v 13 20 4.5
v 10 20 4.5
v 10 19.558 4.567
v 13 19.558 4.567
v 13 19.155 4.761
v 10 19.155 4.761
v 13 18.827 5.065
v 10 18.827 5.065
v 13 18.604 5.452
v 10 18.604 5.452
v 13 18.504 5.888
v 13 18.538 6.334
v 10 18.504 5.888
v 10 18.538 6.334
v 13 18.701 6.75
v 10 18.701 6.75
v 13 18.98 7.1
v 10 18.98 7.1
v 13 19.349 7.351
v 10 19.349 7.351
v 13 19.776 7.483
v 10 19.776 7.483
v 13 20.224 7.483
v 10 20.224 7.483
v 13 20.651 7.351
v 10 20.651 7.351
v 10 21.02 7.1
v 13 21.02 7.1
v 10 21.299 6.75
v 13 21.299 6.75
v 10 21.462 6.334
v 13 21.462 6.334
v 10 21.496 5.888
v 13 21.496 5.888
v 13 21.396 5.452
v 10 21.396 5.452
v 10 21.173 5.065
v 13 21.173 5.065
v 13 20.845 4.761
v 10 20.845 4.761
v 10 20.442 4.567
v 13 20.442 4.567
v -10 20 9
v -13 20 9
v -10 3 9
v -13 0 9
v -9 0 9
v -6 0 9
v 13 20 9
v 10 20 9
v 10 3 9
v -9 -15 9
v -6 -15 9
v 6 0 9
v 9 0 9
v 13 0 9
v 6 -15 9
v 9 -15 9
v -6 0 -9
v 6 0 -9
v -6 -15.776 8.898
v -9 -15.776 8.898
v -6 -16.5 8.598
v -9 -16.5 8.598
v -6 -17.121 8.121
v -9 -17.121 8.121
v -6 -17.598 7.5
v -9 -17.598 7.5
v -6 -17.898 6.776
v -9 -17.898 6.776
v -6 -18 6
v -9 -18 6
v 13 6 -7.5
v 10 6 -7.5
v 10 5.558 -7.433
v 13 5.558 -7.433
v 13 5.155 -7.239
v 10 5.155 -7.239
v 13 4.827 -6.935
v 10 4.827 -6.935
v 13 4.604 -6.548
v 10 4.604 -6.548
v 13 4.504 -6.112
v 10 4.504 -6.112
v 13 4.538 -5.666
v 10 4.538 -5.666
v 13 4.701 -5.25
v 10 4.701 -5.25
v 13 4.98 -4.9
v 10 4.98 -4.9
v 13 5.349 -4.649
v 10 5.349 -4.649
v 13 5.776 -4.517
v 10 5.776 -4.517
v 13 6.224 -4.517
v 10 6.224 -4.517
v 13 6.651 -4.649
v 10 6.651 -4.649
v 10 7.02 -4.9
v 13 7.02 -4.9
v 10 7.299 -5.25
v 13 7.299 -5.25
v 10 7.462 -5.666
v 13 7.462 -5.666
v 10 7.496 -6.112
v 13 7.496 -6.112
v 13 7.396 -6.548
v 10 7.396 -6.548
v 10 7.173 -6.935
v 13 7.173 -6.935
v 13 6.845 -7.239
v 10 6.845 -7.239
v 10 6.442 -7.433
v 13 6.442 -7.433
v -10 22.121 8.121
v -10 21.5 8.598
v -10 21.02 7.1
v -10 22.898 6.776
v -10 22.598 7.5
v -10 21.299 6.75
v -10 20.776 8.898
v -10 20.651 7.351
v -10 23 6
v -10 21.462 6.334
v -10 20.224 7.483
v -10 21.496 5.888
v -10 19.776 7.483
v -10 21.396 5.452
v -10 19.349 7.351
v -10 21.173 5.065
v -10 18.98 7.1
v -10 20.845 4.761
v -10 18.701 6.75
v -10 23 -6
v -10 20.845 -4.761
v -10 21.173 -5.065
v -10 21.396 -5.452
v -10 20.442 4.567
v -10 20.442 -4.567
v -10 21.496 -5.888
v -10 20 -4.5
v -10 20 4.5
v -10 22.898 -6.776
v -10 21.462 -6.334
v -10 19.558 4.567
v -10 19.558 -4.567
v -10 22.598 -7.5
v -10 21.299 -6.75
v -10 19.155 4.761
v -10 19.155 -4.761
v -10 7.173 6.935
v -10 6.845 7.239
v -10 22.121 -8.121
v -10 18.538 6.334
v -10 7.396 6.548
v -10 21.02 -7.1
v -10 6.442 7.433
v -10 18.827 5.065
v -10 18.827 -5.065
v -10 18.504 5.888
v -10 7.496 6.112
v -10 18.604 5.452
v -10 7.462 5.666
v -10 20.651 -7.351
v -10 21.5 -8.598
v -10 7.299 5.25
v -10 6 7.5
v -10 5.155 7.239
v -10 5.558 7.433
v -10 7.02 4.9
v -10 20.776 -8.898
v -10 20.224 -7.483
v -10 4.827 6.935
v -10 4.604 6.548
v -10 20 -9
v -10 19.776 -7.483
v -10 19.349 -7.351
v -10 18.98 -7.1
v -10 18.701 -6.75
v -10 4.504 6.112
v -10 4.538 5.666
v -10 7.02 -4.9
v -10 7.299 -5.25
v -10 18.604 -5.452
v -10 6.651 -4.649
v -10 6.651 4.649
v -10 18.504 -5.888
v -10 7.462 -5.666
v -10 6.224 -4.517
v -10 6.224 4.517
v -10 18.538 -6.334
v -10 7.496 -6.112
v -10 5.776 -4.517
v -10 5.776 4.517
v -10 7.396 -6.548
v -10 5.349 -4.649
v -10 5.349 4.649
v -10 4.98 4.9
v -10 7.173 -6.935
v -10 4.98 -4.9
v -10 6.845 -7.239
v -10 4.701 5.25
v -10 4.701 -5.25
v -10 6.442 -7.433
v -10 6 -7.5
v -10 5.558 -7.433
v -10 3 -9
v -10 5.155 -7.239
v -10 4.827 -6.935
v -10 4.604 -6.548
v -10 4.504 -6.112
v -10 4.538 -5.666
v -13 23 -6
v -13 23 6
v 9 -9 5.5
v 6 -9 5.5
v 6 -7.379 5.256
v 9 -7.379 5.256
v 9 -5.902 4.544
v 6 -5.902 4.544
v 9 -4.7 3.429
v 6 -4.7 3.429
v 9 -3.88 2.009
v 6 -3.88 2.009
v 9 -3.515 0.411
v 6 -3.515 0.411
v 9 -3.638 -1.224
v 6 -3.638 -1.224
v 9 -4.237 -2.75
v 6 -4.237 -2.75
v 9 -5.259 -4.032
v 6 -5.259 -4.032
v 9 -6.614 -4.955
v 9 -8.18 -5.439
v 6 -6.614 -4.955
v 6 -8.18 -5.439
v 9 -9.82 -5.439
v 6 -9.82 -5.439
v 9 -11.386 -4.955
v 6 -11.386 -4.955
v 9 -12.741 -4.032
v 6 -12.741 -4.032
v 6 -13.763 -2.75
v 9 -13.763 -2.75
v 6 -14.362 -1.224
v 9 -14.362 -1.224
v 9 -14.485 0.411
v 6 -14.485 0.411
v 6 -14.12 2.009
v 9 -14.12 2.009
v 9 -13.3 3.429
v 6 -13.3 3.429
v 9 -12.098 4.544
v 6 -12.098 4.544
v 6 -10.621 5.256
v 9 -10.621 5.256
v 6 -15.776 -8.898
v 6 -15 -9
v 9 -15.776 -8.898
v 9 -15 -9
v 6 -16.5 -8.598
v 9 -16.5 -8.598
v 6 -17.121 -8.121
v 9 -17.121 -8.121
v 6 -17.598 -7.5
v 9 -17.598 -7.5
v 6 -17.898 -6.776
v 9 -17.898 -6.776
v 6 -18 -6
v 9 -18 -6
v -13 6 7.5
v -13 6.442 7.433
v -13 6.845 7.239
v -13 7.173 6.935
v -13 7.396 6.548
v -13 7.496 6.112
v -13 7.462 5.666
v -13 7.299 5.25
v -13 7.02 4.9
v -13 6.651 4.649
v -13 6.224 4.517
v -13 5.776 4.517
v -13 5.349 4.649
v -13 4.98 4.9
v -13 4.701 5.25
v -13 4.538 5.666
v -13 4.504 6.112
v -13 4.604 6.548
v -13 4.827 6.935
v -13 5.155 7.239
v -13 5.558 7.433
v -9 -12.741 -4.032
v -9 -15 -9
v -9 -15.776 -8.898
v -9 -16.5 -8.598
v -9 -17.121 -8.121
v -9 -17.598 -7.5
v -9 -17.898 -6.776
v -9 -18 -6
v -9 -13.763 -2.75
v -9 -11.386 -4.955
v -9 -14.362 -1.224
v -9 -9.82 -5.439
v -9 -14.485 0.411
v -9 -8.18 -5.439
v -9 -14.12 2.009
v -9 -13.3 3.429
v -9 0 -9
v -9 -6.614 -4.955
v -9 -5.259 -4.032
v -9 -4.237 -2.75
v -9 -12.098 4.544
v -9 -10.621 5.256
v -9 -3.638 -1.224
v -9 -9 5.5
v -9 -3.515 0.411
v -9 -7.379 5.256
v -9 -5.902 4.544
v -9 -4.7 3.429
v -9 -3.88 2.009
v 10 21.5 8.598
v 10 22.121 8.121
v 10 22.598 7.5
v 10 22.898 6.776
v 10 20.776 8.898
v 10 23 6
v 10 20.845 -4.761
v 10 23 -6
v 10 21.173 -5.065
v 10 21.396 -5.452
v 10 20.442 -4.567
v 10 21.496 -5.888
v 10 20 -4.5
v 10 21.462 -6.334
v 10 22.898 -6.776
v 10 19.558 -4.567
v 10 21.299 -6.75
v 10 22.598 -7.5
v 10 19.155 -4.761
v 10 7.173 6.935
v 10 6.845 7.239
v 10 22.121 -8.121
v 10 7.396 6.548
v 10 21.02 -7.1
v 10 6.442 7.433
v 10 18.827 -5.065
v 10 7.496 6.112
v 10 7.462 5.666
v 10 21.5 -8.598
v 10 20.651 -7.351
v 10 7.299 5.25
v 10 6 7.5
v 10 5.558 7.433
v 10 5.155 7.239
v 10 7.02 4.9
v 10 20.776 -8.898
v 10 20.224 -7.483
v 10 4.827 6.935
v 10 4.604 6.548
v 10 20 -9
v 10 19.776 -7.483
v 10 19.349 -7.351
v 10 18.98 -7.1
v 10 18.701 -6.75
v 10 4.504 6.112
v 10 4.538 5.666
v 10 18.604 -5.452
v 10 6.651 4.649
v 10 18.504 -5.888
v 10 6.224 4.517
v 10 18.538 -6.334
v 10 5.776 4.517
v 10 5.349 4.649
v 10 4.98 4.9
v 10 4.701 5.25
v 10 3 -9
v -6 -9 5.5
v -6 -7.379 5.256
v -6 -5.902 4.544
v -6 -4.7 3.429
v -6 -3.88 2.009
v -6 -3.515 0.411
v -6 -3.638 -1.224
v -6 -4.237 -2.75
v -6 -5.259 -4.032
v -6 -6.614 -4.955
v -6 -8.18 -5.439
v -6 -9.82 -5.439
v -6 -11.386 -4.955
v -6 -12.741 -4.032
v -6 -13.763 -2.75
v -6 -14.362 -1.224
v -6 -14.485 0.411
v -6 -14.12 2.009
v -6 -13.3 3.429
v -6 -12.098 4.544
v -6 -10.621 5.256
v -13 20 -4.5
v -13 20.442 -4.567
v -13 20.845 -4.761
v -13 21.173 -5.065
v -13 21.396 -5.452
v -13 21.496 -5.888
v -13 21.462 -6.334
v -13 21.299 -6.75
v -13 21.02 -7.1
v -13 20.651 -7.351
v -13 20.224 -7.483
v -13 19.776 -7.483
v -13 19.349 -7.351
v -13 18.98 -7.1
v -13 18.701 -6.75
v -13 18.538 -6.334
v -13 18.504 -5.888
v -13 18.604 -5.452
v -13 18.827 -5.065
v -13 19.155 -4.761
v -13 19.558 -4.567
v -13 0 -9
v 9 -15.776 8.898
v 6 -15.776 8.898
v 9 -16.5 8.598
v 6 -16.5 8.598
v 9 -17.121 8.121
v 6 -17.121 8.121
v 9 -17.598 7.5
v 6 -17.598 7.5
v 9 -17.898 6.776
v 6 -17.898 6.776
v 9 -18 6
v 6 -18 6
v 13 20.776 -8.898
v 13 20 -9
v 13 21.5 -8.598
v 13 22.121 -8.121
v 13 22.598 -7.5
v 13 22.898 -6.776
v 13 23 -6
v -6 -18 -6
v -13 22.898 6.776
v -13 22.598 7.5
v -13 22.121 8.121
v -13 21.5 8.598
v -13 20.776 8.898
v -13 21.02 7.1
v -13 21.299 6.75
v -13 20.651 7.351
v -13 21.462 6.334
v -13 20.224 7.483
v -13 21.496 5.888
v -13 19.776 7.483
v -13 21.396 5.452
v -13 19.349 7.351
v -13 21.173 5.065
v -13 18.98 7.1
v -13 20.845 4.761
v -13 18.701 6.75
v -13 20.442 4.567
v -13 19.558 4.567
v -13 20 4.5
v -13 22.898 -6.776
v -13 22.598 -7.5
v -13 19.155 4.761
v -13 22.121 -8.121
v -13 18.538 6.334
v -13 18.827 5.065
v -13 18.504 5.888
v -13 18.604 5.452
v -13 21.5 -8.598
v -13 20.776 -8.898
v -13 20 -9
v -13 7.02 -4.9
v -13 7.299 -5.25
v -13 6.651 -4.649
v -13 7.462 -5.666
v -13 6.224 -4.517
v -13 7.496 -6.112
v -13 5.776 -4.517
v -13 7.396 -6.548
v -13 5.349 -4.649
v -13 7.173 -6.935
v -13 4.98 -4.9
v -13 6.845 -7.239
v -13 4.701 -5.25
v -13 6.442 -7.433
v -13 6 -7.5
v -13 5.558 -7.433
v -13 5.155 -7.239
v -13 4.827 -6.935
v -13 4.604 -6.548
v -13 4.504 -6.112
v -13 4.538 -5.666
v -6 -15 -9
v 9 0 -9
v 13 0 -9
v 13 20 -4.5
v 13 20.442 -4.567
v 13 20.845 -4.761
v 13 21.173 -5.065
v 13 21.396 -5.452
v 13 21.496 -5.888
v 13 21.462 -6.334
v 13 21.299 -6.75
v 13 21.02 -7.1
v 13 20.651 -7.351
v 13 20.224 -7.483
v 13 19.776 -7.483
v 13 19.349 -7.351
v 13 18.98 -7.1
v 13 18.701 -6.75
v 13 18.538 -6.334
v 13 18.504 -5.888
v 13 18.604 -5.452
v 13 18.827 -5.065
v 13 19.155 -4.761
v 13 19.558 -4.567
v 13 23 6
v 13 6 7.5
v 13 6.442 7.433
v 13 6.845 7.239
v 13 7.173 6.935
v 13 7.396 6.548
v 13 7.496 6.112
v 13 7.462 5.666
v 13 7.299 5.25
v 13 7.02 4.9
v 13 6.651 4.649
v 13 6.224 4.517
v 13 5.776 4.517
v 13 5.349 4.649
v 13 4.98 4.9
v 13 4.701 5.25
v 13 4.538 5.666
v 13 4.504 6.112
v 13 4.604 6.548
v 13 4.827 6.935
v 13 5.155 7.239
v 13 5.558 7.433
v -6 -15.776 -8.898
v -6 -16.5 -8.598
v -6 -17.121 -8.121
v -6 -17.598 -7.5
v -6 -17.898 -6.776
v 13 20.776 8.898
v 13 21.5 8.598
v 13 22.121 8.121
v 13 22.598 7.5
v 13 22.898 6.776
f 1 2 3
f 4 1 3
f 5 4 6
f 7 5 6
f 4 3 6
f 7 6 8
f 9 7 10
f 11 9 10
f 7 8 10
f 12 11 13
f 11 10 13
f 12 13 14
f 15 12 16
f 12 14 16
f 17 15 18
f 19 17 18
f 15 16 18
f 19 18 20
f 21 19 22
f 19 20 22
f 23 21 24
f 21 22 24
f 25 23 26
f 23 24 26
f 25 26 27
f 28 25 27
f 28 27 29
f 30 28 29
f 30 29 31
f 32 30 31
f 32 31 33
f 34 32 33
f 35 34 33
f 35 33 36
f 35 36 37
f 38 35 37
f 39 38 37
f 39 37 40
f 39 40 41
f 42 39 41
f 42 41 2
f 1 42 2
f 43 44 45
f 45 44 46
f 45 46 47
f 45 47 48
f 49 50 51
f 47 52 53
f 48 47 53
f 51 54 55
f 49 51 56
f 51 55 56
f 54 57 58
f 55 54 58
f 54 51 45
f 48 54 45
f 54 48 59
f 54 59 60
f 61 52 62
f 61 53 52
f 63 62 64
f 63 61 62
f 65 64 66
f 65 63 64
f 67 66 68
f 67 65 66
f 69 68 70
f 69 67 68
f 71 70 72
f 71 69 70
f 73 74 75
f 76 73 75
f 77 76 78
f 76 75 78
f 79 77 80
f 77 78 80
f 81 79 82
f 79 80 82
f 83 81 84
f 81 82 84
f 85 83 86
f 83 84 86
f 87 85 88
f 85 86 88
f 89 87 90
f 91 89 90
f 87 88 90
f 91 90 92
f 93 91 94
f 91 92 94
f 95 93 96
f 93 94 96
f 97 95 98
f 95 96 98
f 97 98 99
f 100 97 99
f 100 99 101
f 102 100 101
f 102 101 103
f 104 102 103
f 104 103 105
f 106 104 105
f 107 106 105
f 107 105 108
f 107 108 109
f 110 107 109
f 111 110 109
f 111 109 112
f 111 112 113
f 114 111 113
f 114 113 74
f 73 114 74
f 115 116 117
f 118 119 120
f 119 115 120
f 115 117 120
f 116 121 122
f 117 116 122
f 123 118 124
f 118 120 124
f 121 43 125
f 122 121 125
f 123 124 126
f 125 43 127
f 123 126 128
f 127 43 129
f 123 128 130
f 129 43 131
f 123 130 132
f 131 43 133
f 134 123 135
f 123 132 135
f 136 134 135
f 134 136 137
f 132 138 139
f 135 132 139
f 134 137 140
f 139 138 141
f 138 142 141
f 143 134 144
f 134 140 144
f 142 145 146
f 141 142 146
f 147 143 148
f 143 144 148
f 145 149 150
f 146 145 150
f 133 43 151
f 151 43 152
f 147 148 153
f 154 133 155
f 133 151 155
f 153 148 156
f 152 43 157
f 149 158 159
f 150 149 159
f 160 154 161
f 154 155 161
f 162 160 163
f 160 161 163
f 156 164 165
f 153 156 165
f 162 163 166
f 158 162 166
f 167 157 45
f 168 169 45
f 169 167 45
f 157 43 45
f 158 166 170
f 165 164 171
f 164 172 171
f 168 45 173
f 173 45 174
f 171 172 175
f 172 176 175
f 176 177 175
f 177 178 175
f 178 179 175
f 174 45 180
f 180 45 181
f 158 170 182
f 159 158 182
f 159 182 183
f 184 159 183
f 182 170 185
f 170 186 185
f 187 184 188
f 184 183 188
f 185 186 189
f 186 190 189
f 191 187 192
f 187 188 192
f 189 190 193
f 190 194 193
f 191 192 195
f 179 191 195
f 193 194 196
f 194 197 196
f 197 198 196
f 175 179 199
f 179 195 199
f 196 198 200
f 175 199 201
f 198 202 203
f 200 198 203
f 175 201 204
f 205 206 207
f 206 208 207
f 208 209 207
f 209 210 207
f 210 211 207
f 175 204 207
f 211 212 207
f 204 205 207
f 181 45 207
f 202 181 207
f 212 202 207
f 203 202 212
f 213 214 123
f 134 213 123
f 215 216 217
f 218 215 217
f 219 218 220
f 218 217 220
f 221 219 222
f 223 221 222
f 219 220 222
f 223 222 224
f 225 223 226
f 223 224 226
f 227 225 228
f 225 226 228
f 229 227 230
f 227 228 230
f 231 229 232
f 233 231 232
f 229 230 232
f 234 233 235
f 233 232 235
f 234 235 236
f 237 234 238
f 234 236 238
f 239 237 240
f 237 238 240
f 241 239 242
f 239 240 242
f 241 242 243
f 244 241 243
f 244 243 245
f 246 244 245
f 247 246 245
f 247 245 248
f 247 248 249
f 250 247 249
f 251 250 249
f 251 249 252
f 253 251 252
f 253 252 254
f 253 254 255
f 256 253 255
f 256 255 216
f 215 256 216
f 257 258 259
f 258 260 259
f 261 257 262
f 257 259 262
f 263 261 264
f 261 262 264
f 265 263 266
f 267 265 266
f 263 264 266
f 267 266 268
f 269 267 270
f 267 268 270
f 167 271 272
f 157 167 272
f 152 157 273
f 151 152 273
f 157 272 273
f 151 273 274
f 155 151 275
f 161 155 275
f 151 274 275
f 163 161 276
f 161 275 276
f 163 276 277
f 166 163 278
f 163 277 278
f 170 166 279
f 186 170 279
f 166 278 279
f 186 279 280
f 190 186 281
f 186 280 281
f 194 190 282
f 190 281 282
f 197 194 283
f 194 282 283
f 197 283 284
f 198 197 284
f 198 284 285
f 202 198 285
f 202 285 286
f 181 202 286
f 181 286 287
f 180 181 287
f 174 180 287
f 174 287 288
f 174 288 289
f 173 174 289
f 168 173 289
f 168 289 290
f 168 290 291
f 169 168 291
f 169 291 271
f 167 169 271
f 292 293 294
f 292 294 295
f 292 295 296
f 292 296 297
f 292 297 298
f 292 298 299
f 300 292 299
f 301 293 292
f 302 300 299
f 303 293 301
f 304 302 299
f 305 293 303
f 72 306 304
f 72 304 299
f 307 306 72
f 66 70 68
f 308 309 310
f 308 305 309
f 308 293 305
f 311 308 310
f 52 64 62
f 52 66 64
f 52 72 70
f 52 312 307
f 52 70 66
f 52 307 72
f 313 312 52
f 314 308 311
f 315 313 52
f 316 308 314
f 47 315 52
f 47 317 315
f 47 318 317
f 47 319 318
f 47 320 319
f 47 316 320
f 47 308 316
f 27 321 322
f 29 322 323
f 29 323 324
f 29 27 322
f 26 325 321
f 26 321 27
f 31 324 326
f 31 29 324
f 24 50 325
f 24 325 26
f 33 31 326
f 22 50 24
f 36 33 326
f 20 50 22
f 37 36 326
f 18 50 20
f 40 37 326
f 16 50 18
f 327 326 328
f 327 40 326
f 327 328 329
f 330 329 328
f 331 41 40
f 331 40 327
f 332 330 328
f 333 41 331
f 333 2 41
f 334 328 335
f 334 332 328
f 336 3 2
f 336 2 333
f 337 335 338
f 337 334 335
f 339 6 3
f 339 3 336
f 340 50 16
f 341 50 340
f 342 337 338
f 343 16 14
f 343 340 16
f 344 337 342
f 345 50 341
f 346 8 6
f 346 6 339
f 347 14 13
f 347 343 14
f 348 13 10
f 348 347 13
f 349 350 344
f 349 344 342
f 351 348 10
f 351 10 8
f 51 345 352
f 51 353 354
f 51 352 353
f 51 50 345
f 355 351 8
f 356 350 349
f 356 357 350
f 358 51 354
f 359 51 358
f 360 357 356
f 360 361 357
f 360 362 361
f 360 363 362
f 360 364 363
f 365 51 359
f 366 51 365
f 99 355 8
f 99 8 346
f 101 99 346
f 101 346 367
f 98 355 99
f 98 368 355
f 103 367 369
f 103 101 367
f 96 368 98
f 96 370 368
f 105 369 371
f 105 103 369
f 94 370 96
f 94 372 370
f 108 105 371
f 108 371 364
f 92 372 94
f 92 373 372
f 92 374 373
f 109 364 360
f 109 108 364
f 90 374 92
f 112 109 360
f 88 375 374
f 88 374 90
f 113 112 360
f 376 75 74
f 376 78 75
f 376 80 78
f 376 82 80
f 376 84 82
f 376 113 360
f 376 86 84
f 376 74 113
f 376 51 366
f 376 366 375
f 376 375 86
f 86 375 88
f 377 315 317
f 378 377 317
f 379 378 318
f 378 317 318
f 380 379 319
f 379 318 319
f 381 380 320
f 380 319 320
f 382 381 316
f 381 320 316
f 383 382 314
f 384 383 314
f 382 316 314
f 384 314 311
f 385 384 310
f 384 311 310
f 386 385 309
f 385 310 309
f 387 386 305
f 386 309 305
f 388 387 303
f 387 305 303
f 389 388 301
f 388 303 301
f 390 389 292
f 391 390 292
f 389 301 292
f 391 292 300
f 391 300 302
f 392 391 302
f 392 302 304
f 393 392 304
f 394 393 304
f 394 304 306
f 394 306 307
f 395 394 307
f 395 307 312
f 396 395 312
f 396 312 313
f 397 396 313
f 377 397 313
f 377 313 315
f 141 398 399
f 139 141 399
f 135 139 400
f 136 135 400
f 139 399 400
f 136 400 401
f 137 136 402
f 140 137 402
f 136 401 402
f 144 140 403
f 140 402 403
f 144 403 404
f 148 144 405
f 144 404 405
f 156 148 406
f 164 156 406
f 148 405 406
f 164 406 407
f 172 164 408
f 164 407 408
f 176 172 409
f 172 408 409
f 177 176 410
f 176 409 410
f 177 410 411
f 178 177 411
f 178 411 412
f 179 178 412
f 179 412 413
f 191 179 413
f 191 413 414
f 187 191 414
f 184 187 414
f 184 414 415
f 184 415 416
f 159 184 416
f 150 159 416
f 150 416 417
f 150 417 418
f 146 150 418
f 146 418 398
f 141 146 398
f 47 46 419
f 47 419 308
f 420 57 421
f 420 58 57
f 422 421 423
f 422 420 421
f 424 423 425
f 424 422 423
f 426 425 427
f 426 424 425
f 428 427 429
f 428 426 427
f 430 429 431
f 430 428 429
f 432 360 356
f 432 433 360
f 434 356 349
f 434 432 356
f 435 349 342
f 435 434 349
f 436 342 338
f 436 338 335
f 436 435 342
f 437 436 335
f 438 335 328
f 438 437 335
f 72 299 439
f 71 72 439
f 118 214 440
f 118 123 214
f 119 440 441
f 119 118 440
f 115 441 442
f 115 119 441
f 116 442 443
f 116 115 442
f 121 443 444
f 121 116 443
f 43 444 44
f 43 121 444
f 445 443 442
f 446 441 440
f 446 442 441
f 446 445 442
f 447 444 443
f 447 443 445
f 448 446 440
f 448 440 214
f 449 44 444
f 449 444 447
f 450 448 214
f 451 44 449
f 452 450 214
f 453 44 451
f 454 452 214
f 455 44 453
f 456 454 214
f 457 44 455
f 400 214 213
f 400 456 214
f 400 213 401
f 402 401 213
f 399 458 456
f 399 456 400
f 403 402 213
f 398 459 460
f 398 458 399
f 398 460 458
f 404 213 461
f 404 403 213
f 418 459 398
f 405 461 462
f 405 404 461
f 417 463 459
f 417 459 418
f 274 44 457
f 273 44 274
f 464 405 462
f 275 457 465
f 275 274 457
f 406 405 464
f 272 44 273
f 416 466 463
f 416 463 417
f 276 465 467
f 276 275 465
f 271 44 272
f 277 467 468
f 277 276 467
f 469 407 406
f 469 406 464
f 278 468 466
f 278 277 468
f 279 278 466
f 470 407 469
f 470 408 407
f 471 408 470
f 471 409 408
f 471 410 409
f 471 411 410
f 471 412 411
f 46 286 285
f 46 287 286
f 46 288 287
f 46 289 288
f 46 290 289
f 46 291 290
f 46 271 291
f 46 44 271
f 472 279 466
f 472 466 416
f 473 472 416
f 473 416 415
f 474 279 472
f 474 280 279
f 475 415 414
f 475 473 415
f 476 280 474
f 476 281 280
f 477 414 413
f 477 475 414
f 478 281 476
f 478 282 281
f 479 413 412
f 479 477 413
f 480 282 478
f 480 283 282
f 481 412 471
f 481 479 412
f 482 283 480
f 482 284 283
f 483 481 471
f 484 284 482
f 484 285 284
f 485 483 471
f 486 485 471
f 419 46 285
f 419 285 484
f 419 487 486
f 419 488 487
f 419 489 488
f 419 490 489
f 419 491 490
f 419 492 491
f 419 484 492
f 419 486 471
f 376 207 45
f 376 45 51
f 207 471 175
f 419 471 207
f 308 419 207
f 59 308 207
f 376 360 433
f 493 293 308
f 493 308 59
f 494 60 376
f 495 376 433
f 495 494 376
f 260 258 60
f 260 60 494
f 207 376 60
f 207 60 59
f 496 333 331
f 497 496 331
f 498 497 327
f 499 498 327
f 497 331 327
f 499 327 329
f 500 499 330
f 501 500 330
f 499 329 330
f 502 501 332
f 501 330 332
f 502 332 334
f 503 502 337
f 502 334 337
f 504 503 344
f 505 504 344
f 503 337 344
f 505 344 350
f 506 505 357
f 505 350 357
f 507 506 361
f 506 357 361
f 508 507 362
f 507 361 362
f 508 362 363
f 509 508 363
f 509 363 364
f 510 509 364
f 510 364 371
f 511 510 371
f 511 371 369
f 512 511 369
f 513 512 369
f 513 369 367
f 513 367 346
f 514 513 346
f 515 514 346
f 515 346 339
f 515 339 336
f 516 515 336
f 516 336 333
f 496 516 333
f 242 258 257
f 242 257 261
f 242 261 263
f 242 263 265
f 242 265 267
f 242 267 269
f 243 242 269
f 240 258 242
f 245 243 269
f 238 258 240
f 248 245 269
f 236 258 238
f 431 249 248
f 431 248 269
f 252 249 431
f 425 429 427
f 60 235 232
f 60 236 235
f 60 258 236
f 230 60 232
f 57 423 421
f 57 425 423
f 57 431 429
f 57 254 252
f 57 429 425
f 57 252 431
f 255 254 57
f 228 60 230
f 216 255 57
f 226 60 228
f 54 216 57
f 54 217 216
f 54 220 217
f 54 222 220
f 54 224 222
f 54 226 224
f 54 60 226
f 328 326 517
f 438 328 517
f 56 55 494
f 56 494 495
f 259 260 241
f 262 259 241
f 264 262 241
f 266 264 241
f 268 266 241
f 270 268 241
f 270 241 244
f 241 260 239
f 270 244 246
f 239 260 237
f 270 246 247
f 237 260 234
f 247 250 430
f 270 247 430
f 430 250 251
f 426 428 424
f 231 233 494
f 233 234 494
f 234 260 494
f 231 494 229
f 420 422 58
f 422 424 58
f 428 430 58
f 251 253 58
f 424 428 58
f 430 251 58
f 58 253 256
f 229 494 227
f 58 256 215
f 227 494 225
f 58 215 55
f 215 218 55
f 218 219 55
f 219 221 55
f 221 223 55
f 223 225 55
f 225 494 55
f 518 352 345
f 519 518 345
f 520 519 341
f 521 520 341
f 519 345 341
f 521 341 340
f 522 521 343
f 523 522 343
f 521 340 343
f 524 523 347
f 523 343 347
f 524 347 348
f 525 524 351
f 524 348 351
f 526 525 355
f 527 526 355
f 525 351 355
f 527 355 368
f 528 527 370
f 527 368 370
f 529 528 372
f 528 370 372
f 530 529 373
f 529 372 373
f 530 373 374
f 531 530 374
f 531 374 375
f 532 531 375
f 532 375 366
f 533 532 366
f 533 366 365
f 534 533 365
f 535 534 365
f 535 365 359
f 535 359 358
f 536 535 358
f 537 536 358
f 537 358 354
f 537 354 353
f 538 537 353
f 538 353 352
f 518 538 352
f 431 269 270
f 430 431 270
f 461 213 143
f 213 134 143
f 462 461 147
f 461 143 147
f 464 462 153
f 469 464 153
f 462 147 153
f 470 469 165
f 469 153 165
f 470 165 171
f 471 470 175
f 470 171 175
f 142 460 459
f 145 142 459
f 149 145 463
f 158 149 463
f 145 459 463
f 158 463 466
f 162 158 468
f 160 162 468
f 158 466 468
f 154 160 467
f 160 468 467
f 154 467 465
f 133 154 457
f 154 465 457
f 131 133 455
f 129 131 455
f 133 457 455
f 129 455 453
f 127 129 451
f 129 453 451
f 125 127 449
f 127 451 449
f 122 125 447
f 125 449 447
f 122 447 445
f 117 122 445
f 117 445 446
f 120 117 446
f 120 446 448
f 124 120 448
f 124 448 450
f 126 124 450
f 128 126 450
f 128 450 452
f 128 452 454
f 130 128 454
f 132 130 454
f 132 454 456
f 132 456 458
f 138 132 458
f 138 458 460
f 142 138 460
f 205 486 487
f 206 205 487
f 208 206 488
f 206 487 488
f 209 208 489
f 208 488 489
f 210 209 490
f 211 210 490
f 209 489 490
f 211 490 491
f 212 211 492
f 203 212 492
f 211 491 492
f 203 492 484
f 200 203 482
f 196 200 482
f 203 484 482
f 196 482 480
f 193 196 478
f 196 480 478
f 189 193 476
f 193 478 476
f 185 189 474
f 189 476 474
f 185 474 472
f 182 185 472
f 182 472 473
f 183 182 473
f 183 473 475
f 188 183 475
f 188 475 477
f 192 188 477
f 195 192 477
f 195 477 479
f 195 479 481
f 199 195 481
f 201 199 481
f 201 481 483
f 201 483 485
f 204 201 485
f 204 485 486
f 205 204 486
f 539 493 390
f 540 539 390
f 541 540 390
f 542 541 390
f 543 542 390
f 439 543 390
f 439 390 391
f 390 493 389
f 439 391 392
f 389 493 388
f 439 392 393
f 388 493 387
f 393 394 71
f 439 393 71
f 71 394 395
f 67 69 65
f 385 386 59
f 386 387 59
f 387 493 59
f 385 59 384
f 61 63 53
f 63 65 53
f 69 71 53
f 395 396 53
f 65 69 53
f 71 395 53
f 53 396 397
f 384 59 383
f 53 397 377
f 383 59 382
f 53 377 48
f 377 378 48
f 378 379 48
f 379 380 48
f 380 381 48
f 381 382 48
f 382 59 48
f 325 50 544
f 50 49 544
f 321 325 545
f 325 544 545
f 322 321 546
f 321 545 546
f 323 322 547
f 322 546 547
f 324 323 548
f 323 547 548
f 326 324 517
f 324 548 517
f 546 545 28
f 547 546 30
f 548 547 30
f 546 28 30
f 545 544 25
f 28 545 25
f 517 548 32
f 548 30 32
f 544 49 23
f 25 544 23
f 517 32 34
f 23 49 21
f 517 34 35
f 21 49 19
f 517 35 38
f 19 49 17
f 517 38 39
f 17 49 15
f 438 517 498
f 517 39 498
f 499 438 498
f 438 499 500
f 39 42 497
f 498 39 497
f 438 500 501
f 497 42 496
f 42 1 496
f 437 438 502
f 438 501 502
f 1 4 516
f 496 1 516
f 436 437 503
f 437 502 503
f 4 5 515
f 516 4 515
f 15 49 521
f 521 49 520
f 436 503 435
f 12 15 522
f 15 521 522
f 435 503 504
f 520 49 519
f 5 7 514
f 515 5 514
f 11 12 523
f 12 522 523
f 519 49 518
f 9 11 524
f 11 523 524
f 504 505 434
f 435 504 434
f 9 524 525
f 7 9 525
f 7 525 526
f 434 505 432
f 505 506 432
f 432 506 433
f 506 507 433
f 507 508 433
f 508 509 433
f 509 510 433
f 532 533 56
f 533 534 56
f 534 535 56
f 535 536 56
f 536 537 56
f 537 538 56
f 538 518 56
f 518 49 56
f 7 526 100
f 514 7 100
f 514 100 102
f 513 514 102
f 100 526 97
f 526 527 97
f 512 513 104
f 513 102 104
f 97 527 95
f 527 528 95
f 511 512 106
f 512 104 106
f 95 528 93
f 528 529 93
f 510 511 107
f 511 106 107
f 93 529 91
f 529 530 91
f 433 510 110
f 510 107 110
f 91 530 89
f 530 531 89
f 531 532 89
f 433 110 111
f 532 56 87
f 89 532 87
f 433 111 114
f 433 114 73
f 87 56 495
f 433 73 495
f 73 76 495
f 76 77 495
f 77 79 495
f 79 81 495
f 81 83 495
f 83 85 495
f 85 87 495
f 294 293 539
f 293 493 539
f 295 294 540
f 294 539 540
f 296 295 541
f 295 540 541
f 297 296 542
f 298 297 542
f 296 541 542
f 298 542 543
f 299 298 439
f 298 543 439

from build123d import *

# Parameters (mm, degrees)
SKETCH_1_W          = 26
SKETCH_1_H          = 18
EXTRUDE_1_DEPTH     = 3
SKETCH_2_W          = 3
SKETCH_2_H          = 18
EXTRUDE_2_DEPTH     = 20
SKETCH_3_W          = 3
SKETCH_3_H          = 18
EXTRUDE_3_DEPTH     = 18
SKETCH_4_R          = 1.5
CUT_EXTRUDE_1_DEPTH = 36.860842154
FILLET_1_R          = 3
SKETCH_5_R          = 5.5
CUT_EXTRUDE_2_DEPTH = 36.860842154
FILLET_2_R          = 3


with BuildPart() as part:
    # 草图1 → 凸台-拉伸1 (new body)
    with BuildSketch(Plane(origin=(0, 0, 0), x_dir=(1, 0, 0), z_dir=(0, 1, 0))):
        Rectangle(SKETCH_1_W, SKETCH_1_H)
    extrude(amount=EXTRUDE_1_DEPTH)

    # 草图2 → 凸台-拉伸2 (add)
    with BuildSketch(Plane(origin=(0, 3, 0), x_dir=(1, 0, 0), z_dir=(0, 1, 0))):
        with Locations((-11.5, 0)):
            Rectangle(SKETCH_2_W, SKETCH_2_H)
        with Locations((11.5, 0)):
            Rectangle(SKETCH_2_W, SKETCH_2_H)
    extrude(amount=EXTRUDE_2_DEPTH)

    # 草图3 → 凸台-拉伸3 (add)
    with BuildSketch(Plane.XZ):
        with Locations((-7.5, 0)):
            Rectangle(SKETCH_3_W, SKETCH_3_H)
        with Locations((7.5, 0)):
            Rectangle(SKETCH_3_W, SKETCH_3_H)
    extrude(amount=EXTRUDE_3_DEPTH)

    # 草图4 → 切除-拉伸1 (cut, through all)
    with BuildSketch(Plane.ZY.offset(13)):
        with Locations((-6, 20)):
            Circle(SKETCH_4_R)
        with Locations(Location((6, 20, 0), (0, 0, 180))):
            Circle(SKETCH_4_R)
        with Locations((6, 6)):
            Circle(SKETCH_4_R)
        with Locations(Location((-6, 6, 0), (0, 0, 180))):
            Circle(SKETCH_4_R)
    extrude(amount=-CUT_EXTRUDE_1_DEPTH, mode=Mode.SUBTRACT)

    # 圆角1
    fillet_1_edges = [part.edges().sort_by_distance(p)[0] for p in [
        (-11.5, 23, 9),
        (-11.5, 23, -9),
        (11.5, 23, -9),
        (11.5, 23, 9),
    ]]
    fillet(fillet_1_edges, radius=FILLET_1_R)

    # 草图5 → 切除-拉伸2 (cut, through all)
    with BuildSketch(Plane.ZY.offset(13)):
        with Locations((0, -9)):
            Circle(SKETCH_5_R)
    extrude(amount=-CUT_EXTRUDE_2_DEPTH, mode=Mode.SUBTRACT)

    # 圆角2
    fillet_2_edges = [part.edges().sort_by_distance(p)[0] for p in [
        (-7.5, -18, -9),
        (-7.5, -18, 9),
        (7.5, -18, 9),
        (7.5, -18, -9),
    ]]
    fillet(fillet_2_edges, radius=FILLET_2_R)


solid = part.part
